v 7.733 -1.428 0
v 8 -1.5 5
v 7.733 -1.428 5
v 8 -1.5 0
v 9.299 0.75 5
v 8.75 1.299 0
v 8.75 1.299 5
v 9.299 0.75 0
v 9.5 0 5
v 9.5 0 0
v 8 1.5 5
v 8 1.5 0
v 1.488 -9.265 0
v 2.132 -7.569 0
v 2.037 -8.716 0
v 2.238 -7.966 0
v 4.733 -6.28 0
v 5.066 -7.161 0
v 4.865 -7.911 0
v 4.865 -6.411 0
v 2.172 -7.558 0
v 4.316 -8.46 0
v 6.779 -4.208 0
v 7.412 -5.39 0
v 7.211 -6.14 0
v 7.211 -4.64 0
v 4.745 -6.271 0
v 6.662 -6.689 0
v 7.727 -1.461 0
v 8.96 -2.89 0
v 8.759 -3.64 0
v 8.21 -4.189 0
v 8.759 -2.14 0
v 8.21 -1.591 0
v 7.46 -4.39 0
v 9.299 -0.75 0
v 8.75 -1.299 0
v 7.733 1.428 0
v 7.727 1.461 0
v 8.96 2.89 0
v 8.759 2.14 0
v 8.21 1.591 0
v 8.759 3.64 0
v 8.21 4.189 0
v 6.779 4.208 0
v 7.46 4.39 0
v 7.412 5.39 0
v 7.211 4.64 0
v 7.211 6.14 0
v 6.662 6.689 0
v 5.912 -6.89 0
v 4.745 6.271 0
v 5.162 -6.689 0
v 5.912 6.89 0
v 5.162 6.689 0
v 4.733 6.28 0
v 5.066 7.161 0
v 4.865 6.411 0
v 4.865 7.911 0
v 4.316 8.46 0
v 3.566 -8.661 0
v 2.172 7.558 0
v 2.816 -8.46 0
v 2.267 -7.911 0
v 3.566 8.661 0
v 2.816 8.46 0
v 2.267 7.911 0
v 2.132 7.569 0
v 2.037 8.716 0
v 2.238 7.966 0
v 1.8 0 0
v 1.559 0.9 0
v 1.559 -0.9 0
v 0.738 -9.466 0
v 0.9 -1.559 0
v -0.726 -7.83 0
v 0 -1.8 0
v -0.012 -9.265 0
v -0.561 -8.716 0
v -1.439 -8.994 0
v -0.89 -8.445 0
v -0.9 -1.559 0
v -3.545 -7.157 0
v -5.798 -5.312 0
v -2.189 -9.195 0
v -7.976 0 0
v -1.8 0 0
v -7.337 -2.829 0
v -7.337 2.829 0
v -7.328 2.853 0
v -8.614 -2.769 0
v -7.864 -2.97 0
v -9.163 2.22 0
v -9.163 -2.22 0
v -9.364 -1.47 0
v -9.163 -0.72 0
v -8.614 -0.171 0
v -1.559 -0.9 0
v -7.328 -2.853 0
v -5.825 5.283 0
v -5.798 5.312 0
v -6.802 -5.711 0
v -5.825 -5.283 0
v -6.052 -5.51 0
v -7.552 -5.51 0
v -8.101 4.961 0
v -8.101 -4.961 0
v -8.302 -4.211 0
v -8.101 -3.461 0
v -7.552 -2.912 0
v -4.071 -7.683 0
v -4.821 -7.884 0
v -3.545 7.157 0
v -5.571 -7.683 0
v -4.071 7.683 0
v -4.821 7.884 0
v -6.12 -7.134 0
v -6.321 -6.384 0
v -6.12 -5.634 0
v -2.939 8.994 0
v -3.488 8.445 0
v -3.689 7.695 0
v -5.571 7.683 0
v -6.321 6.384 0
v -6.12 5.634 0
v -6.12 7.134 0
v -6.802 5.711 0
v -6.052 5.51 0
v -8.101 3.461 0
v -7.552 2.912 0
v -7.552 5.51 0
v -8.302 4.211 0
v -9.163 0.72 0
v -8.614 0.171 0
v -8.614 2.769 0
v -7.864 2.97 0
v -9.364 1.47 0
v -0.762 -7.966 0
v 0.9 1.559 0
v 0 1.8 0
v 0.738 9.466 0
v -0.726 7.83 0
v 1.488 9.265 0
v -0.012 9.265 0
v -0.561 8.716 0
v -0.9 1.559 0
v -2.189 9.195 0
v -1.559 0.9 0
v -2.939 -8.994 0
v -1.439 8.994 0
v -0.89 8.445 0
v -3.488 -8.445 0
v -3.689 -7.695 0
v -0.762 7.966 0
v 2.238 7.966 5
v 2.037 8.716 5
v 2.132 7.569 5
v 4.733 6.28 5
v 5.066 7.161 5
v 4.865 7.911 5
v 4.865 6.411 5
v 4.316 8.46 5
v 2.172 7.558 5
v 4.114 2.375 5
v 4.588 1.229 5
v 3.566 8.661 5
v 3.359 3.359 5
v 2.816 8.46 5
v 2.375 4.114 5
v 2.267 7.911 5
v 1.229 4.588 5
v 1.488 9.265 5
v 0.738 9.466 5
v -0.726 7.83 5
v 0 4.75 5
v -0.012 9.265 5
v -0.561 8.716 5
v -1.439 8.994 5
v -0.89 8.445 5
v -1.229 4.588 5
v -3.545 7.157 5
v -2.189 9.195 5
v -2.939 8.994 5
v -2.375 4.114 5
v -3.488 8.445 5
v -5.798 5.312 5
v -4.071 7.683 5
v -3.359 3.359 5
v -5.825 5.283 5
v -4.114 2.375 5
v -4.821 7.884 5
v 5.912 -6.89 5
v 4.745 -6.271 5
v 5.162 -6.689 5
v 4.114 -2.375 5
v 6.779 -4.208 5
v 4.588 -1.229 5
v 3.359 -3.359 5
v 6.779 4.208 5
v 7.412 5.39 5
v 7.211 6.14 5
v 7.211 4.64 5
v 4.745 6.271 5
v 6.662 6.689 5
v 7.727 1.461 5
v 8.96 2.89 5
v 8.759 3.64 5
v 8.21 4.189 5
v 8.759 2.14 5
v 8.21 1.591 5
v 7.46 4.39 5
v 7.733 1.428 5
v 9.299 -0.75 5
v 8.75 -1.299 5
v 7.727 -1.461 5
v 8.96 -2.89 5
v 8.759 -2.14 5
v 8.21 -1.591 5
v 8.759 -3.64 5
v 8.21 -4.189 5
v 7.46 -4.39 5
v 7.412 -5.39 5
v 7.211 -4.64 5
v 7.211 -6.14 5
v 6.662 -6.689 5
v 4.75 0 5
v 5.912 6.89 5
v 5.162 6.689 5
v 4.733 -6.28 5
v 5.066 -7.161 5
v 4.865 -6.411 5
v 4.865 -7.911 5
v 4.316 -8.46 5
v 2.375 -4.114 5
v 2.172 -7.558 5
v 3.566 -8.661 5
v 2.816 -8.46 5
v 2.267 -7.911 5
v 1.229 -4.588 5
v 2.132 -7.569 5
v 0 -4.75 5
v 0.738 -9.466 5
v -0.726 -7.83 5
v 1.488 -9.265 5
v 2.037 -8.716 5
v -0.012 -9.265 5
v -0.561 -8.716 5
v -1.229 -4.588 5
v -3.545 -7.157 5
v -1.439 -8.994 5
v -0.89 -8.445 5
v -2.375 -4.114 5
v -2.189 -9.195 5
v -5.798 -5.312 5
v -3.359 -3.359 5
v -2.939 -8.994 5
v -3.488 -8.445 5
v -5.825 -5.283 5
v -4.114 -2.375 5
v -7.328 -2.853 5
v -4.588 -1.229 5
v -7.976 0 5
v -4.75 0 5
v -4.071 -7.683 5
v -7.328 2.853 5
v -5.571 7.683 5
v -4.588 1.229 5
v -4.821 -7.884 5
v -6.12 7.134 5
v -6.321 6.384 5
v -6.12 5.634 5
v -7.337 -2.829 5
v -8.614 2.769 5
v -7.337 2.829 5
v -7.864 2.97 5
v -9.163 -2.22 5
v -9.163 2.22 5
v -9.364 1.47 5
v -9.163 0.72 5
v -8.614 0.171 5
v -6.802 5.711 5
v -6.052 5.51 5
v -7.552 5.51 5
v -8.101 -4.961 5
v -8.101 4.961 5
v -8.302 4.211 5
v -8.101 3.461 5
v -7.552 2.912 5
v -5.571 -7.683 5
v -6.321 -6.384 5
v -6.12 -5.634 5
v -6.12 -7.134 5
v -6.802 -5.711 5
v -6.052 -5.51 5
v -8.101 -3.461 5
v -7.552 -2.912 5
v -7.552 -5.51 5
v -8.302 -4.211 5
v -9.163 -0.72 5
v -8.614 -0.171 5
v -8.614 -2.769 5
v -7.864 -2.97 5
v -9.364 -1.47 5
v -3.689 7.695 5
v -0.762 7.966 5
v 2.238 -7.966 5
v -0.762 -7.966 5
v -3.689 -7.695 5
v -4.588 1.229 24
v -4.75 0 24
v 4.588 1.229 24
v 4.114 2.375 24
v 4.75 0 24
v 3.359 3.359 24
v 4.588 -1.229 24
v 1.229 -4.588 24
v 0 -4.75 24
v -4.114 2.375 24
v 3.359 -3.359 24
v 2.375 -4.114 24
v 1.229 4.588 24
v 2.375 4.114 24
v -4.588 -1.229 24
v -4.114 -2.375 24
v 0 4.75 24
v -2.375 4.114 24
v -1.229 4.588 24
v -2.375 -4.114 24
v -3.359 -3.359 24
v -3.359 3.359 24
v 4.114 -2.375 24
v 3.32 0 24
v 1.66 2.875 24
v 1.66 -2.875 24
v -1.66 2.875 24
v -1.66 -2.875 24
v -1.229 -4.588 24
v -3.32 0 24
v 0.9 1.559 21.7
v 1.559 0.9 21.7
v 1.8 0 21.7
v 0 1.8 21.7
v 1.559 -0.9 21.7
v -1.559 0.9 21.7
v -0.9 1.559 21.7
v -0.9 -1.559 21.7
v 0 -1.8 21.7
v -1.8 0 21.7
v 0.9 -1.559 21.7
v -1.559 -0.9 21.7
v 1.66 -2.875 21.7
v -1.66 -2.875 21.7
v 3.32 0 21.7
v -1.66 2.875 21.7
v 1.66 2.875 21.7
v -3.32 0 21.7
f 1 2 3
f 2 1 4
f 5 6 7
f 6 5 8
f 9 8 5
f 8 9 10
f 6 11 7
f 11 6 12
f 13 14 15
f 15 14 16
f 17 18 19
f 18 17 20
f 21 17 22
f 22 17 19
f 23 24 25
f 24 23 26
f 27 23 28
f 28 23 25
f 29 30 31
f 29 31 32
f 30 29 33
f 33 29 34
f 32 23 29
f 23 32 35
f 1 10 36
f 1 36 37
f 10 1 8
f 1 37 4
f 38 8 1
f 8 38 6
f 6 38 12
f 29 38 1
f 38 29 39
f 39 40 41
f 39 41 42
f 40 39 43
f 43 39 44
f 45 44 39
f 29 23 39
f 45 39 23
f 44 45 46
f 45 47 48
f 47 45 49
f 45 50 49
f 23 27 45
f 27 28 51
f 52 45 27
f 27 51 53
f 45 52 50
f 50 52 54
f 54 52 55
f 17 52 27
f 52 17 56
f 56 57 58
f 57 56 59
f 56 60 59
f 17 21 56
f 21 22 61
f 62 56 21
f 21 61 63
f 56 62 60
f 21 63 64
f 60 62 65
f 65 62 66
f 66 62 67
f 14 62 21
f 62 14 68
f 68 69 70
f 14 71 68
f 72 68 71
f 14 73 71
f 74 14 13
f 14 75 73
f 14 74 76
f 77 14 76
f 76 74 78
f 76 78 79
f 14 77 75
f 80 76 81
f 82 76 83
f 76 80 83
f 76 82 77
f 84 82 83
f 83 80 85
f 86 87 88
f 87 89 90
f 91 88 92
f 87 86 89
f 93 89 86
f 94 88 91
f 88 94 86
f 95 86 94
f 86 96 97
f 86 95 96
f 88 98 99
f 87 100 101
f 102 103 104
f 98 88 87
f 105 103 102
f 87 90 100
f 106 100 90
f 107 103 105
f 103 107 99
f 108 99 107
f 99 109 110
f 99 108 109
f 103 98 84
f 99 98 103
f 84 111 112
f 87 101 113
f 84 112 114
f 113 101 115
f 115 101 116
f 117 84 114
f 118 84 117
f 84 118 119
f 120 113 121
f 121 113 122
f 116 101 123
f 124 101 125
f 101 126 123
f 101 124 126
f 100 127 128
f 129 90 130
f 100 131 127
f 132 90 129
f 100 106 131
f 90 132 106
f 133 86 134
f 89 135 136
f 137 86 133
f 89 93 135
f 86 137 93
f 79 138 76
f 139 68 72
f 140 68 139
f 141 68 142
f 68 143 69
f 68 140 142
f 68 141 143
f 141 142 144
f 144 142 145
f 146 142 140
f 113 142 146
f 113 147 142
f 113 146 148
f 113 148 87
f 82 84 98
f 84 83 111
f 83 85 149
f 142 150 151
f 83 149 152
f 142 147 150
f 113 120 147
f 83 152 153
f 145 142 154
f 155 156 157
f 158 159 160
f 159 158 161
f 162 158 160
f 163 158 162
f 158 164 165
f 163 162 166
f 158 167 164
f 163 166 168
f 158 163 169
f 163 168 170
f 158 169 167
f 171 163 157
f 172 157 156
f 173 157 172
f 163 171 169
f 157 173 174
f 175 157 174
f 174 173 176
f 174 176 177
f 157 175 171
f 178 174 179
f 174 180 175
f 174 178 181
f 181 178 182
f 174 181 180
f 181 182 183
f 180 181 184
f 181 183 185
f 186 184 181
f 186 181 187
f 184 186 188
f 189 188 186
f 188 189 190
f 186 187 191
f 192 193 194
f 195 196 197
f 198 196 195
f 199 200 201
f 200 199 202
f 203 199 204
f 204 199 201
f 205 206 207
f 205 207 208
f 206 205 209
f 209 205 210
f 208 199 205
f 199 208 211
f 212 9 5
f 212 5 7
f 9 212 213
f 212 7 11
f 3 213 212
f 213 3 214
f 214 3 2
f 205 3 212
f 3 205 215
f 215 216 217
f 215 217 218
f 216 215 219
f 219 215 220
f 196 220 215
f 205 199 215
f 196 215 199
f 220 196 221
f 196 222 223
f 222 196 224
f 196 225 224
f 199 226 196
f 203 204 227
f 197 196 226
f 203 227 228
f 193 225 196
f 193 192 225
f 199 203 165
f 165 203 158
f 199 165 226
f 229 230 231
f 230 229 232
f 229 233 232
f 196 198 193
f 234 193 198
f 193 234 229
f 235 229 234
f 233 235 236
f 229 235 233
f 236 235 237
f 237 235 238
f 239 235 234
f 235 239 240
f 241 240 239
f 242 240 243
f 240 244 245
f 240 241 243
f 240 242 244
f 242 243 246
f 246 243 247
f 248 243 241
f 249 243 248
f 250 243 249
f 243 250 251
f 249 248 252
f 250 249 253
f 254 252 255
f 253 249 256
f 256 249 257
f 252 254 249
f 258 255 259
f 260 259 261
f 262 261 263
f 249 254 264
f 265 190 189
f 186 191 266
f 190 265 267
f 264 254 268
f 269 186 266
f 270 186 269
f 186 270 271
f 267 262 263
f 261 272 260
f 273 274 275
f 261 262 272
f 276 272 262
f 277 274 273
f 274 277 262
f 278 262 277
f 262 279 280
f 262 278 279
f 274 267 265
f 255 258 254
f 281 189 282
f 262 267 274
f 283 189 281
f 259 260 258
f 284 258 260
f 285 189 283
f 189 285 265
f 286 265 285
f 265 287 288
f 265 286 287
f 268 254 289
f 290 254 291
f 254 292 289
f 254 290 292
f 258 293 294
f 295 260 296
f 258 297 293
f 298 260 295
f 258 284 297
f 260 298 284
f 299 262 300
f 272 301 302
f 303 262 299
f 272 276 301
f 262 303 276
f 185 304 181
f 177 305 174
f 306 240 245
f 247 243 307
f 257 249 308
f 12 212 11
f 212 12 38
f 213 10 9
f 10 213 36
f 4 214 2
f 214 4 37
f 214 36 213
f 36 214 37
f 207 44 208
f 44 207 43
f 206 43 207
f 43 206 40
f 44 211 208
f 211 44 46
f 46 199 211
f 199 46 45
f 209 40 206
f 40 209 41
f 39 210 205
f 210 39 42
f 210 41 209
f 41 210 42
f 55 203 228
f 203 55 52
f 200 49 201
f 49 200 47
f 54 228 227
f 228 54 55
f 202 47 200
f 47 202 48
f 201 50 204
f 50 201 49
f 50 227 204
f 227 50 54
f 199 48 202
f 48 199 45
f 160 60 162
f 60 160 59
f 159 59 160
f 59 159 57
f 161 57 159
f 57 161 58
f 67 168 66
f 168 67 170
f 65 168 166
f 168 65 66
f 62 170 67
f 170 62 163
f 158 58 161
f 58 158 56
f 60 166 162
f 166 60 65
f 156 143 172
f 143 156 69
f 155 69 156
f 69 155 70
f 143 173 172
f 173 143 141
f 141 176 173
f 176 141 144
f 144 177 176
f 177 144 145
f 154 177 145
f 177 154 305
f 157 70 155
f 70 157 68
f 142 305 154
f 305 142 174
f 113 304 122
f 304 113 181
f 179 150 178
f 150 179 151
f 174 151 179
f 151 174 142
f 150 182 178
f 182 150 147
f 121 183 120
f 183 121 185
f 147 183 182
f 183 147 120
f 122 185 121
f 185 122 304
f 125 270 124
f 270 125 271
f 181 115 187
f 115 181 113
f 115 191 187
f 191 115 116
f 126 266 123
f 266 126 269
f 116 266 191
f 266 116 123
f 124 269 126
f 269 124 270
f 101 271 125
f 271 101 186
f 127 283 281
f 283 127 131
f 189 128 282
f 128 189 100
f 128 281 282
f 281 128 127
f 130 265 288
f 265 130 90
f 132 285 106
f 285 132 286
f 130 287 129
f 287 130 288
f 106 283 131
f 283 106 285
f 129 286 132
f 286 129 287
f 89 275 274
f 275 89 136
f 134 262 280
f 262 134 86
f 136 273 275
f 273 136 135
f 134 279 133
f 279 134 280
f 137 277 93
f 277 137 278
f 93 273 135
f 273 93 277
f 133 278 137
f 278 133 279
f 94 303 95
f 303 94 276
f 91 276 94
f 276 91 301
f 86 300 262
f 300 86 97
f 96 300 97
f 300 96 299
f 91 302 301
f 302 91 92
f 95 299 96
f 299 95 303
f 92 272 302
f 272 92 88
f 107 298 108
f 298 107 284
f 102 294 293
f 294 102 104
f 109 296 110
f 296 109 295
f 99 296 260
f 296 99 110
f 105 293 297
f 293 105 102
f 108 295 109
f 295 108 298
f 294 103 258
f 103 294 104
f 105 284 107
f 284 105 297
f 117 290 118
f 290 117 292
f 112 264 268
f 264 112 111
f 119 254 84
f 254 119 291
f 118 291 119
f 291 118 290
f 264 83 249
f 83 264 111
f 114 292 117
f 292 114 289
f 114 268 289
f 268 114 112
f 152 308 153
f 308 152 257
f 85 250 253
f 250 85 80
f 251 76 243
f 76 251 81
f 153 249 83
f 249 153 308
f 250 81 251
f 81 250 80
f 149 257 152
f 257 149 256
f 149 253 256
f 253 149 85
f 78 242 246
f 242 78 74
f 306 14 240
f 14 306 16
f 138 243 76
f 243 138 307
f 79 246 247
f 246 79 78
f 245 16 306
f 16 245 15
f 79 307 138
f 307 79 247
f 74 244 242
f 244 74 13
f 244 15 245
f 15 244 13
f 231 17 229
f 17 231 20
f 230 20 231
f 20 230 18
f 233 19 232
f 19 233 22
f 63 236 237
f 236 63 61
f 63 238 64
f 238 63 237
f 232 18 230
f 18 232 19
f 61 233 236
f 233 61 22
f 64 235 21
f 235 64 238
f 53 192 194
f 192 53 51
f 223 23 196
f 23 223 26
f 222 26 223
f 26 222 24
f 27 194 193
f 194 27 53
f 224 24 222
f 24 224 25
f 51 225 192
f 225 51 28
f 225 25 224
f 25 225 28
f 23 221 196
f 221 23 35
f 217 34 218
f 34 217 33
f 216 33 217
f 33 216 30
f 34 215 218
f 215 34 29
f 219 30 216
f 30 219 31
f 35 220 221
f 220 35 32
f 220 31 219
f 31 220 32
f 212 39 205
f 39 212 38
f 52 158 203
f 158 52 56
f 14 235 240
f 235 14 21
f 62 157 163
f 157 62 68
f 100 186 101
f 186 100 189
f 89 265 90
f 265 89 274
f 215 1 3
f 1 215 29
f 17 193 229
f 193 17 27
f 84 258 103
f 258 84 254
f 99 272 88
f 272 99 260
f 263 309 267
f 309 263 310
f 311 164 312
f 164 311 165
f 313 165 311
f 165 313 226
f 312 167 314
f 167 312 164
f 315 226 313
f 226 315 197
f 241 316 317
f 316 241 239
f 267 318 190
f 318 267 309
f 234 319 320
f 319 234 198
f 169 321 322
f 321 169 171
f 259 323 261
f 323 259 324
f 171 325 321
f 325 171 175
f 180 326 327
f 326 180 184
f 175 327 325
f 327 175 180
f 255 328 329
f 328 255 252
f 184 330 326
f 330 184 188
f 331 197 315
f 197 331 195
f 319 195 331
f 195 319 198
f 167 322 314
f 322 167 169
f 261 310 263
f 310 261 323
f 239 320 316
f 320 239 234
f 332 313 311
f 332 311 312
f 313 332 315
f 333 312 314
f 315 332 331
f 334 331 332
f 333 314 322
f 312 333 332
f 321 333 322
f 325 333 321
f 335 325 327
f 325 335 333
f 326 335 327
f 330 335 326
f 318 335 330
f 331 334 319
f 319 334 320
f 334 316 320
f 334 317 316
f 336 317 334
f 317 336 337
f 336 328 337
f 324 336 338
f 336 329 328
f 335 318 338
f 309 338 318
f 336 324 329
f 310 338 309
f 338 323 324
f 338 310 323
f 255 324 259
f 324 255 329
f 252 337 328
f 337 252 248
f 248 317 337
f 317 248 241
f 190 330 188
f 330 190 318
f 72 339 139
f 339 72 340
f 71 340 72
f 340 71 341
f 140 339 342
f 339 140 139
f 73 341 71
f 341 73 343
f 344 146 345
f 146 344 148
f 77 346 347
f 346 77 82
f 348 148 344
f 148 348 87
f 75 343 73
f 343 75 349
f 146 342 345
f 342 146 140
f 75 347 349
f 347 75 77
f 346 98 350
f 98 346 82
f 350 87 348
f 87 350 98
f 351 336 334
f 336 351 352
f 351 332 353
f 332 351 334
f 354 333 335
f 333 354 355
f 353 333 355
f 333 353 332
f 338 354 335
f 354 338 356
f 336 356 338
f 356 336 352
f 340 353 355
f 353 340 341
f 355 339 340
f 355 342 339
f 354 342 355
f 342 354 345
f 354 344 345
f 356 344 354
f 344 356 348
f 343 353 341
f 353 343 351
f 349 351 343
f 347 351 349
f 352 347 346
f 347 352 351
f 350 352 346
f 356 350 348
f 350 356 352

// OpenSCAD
height = 24;
thick_height = 5;
diameter = 9.5;
thick_diameter = 16;

hole_diameter_tolerance = 0.7;
hole_diameter_base_size = 2.9;
nut_thickness = 2.3;
nut_width_tolerance = 0.35;
nut_width_base_size = 5.4;

module dummy() {}

hole_diameter = hole_diameter_base_size + hole_diameter_tolerance;
nut_width = nut_width_base_size + nut_width_tolerance;

nudge = 0.001;

pi = 3.141592653589793;

module knurledCylinder(h=10,r1=5,r2=1.5) {
    n = ceil(2 * pi * r1 / (2 * r2));
    cylinder(h=h,r=r1,$fn=n);
    for (i=[0:n-1]) {
        x = r1*cos(360./n*i);
        y = r1*sin(360./n*i);
        translate([x,y,0]) cylinder(h=h,r=r2,$fn=12);
    }
}

render(convexity=10)
difference() {
    union() {
        cylinder(h=height,r=diameter/2,$fn=24);
        knurledCylinder(h=thick_height,r1=thick_diameter/2);
    }
    translate([0,0,-nudge]) cylinder(h=height+2*nudge,d=hole_diameter,$fn=12);
    translate([0,0,height-nut_thickness])
    cylinder(h=nut_thickness+nudge,d=nut_width*2/sqrt(3), $fn=6);
}
